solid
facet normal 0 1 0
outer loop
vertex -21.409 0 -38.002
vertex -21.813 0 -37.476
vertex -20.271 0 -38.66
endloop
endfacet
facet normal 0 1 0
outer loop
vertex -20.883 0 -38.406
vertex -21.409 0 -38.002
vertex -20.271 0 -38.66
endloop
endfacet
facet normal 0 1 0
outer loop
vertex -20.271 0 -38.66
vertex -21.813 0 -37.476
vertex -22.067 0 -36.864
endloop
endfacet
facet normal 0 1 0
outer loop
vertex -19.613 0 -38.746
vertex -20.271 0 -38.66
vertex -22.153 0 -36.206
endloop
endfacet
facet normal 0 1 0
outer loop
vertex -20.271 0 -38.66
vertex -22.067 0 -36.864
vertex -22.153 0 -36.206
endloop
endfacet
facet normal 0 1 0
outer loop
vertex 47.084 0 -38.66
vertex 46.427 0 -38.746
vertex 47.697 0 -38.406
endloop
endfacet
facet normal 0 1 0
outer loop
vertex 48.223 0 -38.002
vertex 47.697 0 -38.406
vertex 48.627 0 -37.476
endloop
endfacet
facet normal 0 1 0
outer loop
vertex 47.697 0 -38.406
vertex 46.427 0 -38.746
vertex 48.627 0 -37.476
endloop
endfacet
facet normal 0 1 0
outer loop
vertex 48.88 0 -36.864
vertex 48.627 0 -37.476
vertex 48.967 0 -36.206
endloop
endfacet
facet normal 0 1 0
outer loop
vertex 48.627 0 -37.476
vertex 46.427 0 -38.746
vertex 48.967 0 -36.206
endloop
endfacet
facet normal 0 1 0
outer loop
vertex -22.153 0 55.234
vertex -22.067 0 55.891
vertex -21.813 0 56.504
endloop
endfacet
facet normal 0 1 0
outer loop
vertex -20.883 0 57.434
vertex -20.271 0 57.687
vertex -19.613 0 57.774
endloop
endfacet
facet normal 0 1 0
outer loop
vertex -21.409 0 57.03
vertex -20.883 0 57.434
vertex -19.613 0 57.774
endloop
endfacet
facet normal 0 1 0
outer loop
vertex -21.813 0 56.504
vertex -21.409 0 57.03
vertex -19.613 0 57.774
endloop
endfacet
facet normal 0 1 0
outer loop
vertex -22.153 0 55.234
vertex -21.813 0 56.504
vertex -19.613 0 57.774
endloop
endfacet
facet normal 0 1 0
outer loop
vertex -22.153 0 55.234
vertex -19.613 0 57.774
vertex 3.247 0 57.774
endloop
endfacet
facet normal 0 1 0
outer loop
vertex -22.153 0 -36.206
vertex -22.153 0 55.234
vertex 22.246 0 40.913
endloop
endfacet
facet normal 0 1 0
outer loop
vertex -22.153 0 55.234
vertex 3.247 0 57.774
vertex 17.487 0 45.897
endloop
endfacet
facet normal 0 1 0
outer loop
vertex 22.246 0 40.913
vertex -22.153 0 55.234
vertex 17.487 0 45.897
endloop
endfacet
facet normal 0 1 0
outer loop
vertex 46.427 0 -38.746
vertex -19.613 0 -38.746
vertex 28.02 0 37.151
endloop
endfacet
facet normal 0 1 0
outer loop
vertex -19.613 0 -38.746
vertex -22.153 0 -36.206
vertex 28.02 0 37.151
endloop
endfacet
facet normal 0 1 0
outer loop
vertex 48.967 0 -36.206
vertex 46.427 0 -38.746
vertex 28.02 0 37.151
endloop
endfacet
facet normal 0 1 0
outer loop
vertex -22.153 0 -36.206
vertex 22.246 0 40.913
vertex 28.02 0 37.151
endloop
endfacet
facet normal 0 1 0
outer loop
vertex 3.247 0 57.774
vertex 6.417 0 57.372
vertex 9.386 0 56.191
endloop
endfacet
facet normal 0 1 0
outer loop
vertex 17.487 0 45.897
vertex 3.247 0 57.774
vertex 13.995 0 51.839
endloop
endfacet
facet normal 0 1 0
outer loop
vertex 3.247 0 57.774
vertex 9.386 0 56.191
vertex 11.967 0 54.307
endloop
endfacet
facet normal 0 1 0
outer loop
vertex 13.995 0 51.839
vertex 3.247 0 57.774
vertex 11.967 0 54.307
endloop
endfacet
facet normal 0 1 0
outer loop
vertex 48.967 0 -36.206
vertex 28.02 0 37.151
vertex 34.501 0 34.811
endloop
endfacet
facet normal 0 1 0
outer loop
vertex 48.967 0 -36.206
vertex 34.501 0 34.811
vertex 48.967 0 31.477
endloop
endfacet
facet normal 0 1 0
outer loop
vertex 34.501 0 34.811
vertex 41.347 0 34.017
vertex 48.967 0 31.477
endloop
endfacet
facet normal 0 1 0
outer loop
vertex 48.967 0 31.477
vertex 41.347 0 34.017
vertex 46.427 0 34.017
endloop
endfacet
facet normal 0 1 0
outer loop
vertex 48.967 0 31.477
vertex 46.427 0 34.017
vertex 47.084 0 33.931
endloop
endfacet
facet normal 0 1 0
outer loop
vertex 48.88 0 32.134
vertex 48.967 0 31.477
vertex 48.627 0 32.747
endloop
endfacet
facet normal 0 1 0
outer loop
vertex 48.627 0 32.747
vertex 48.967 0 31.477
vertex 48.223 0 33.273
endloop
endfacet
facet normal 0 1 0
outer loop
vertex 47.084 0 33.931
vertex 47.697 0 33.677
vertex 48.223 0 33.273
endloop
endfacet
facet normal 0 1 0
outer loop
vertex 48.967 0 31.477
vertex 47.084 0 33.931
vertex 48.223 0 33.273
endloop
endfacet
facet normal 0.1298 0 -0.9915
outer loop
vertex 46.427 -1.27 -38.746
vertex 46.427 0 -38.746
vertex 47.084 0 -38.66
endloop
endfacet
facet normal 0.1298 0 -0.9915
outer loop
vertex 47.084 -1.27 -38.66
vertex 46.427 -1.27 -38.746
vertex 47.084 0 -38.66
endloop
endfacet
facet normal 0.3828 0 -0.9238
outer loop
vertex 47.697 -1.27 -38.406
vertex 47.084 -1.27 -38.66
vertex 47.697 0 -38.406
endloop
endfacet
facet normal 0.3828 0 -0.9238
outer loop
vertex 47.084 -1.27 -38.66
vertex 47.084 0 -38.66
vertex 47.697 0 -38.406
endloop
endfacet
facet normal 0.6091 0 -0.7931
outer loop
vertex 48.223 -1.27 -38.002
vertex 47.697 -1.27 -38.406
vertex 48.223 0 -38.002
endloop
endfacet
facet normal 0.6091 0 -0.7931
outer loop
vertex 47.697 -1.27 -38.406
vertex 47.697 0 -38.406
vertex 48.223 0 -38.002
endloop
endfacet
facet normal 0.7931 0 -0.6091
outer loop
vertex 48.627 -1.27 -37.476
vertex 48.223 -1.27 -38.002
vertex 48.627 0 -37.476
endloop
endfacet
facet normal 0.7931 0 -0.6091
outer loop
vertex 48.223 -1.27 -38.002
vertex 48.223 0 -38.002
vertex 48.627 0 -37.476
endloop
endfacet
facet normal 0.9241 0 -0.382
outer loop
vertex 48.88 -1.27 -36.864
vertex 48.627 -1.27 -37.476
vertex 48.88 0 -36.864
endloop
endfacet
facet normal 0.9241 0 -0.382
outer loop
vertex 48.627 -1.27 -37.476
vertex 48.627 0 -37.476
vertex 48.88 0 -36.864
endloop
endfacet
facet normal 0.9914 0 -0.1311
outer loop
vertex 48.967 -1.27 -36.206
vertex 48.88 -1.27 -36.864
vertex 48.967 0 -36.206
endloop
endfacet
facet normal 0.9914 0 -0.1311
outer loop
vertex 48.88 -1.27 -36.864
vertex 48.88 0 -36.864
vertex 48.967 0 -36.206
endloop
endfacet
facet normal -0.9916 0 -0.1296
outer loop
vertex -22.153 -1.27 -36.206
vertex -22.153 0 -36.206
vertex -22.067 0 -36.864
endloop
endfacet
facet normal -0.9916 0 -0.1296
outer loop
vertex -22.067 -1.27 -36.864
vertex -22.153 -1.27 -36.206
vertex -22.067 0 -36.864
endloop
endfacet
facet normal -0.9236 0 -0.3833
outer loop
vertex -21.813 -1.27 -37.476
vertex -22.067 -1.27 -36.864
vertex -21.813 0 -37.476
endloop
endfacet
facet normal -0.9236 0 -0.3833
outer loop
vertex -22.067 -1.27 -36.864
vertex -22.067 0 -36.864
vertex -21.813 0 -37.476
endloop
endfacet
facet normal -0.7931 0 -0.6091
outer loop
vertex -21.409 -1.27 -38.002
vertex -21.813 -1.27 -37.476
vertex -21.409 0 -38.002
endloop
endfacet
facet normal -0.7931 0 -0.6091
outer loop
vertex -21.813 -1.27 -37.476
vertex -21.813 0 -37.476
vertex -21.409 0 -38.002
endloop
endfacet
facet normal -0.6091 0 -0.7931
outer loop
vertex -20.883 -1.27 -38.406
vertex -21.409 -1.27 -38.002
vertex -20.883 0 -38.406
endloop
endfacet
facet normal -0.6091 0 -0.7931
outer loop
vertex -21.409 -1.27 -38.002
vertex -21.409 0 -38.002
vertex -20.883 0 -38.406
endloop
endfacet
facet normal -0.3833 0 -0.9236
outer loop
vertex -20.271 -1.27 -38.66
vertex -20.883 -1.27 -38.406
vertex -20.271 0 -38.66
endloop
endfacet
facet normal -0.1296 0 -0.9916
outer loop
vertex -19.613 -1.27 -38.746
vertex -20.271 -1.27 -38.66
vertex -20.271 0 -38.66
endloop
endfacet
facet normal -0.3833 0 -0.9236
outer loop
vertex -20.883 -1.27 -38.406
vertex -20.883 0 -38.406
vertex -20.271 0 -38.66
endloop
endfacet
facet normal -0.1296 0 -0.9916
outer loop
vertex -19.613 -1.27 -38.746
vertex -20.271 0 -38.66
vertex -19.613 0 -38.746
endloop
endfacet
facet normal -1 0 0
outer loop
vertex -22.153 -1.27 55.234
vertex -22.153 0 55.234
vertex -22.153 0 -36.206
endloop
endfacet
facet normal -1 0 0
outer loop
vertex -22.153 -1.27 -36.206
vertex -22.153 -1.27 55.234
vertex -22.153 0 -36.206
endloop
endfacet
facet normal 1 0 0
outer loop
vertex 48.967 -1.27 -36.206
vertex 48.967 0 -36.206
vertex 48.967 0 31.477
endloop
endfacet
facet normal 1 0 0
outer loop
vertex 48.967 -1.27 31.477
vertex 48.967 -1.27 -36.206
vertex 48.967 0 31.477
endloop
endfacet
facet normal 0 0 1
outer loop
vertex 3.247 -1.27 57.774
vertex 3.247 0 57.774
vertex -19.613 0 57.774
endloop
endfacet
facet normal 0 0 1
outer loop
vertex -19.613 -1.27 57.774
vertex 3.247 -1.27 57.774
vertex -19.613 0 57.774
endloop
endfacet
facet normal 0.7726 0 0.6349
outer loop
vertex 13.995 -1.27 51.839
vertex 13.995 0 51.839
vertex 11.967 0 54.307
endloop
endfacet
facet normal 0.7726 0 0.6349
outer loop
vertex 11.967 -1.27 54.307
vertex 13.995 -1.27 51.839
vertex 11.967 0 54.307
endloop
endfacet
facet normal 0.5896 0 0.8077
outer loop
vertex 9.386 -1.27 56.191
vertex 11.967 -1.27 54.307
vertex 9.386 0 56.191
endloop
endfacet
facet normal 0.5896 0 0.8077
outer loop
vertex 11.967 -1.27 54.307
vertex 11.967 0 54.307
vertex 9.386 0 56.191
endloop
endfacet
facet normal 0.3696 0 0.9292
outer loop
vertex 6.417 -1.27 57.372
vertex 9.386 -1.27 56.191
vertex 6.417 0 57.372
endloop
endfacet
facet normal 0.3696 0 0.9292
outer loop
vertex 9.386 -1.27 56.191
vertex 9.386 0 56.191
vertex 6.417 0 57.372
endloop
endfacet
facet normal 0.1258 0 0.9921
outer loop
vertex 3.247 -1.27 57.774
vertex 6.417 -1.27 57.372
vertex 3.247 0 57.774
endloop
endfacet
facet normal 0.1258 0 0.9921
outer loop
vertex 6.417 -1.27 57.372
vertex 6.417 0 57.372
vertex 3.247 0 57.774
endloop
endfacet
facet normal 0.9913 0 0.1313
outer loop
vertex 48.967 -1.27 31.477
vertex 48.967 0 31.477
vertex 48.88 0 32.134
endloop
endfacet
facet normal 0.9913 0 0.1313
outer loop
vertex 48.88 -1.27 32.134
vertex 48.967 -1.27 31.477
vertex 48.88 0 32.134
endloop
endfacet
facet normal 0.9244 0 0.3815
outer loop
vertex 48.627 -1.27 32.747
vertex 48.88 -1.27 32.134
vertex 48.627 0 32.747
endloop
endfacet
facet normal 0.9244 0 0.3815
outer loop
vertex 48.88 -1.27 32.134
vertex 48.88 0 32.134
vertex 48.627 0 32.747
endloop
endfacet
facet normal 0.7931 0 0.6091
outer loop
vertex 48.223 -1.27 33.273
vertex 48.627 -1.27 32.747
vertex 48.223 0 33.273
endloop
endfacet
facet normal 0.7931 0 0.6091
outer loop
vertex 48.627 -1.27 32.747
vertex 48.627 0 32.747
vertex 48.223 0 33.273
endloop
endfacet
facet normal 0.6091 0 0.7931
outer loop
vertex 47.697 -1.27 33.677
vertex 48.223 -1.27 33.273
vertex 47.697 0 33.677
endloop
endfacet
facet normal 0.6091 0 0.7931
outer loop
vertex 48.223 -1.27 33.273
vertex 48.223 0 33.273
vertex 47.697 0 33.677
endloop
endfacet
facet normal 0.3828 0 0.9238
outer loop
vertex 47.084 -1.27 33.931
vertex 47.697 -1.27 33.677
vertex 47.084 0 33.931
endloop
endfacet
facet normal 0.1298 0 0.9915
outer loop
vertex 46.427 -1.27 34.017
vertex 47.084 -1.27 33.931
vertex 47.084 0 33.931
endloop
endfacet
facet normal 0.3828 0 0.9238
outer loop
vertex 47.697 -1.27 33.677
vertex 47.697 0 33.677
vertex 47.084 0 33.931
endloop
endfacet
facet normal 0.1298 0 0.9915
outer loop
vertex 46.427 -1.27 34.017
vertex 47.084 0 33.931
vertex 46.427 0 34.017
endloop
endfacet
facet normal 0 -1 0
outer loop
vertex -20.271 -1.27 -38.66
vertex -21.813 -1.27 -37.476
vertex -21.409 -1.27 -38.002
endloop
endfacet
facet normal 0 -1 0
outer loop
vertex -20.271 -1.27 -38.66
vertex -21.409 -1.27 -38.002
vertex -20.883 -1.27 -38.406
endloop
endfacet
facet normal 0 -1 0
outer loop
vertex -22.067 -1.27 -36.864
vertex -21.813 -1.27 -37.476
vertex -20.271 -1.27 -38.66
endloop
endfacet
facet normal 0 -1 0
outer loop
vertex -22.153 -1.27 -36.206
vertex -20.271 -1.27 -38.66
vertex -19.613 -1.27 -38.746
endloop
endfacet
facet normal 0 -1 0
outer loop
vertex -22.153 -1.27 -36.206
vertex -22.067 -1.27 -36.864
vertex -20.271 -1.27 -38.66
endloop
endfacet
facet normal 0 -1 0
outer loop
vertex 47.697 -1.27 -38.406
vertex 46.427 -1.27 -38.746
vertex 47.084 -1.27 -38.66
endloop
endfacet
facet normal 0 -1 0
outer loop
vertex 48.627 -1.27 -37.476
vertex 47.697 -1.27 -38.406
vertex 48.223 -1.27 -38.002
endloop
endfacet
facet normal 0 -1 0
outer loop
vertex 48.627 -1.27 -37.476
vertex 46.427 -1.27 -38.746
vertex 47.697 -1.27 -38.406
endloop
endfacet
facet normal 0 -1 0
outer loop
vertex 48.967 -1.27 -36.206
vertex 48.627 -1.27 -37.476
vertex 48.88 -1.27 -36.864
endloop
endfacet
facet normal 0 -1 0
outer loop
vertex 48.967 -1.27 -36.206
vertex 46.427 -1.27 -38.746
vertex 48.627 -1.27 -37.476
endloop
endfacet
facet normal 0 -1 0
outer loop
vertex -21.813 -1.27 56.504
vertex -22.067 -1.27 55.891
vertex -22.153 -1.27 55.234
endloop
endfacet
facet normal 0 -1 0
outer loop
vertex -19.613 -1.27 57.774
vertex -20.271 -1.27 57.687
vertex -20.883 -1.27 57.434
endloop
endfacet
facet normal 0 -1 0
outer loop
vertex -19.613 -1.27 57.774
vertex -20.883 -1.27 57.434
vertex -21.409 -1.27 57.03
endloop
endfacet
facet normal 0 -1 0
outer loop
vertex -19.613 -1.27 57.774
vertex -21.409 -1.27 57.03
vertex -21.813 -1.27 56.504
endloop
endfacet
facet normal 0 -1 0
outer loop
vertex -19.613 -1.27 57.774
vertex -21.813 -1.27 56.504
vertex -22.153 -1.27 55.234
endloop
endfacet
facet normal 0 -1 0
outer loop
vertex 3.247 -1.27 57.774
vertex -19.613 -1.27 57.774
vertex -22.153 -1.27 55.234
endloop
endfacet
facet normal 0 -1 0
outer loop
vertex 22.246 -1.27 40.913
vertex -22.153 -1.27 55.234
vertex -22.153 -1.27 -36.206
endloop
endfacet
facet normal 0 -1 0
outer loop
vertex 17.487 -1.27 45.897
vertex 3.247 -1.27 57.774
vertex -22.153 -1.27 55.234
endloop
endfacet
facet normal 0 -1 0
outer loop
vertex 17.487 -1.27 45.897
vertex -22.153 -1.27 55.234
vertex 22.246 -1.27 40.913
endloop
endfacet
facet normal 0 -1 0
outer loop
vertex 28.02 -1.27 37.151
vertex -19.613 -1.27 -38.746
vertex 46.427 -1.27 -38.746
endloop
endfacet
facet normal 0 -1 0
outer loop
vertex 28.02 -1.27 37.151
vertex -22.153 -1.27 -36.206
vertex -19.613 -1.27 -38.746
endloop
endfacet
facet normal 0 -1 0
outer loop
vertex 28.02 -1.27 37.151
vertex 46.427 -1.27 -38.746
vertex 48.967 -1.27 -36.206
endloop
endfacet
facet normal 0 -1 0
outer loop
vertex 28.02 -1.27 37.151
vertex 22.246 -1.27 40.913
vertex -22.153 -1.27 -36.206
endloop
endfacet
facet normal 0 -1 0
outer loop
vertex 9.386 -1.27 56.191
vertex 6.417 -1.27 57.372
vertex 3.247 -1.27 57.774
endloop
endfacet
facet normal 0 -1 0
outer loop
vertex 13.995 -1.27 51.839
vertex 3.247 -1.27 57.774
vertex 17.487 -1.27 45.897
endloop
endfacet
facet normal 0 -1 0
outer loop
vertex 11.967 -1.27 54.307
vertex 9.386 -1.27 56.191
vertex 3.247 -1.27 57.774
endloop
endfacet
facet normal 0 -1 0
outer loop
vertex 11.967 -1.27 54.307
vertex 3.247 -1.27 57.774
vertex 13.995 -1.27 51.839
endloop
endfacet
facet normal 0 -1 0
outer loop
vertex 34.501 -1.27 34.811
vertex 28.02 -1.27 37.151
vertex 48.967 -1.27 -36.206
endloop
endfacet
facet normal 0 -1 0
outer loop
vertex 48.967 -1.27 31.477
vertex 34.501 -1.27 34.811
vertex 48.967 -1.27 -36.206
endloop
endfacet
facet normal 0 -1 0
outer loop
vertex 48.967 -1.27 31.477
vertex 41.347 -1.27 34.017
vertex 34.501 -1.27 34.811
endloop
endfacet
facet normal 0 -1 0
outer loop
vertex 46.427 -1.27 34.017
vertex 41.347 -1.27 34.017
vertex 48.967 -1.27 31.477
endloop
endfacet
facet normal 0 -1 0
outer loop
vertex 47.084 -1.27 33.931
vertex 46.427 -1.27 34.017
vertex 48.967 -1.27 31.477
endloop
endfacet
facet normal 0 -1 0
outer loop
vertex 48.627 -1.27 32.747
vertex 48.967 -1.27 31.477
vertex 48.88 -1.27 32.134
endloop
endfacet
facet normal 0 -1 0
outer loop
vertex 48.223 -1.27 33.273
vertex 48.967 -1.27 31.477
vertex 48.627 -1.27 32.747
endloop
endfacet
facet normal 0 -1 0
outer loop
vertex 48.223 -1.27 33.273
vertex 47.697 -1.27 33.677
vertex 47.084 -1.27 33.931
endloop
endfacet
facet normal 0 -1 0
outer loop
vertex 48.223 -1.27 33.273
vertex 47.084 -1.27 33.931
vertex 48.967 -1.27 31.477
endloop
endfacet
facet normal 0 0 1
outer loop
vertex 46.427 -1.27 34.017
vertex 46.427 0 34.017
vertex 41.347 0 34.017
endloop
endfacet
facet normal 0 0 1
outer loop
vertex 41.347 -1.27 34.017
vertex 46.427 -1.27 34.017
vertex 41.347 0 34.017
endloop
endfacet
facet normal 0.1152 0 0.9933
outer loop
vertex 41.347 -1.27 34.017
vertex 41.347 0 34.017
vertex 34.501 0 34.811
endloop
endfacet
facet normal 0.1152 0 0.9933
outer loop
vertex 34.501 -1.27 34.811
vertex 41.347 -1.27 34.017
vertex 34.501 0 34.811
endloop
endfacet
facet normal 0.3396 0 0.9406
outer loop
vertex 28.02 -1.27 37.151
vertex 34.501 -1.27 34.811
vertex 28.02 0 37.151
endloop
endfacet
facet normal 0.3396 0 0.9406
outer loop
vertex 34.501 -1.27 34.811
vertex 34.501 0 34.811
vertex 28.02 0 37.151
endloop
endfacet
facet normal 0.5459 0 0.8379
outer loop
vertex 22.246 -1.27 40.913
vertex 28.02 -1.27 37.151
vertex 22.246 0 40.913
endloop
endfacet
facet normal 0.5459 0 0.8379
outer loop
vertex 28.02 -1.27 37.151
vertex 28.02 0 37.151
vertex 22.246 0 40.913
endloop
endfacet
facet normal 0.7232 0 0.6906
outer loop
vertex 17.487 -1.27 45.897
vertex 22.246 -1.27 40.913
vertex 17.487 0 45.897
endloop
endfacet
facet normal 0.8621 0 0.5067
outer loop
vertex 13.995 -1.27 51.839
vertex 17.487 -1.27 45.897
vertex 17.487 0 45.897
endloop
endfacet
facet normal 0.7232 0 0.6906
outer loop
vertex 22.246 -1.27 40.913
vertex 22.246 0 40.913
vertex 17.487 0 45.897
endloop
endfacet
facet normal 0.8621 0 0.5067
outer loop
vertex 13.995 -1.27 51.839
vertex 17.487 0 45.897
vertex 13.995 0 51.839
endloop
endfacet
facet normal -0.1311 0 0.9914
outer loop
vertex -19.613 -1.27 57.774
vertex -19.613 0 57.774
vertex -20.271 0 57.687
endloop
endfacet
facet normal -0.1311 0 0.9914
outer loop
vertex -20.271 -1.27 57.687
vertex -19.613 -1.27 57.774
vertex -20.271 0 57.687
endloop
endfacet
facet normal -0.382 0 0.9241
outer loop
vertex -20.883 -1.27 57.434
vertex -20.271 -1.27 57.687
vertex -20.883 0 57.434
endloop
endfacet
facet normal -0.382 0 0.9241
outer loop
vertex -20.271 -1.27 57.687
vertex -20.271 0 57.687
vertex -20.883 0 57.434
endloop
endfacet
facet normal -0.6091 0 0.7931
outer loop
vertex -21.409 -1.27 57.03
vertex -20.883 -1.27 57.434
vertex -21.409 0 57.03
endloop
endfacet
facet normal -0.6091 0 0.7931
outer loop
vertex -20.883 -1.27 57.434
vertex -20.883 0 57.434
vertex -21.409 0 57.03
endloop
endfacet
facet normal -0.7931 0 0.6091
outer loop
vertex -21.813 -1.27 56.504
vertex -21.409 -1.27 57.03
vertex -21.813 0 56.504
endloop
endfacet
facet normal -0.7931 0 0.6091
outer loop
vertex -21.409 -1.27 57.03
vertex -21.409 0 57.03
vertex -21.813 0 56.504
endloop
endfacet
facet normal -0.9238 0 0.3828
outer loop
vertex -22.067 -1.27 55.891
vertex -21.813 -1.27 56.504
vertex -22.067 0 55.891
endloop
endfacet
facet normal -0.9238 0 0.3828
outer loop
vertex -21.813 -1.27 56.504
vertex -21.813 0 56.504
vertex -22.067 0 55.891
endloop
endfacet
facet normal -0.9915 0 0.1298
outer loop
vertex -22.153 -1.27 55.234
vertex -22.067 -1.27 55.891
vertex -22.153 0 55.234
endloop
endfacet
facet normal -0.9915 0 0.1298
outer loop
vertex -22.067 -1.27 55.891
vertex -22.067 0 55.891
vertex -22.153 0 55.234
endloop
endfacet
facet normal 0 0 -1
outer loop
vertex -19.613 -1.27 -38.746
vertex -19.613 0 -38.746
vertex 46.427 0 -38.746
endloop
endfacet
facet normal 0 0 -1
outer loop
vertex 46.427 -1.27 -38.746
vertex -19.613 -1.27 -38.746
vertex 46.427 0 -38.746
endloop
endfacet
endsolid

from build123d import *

# Parameters (mm, degrees)
F1_DEPTH = 1.27


with BuildPart() as f1:
    # F0 (on Front) → F1 (new body)
    with BuildSketch(Plane.XZ):
        with BuildLine():
            Line((3.246805, 57.773859), (-19.613195, 57.773859))
            ThreePointArc((-19.613195, 57.773859), (-21.409247, 57.02991), (-22.153195, 55.233859))
            Line((-22.153195, 55.233859), (-22.153195, -36.206141))
            ThreePointArc((-22.153195, -36.206141), (-21.409247, -38.002193), (-19.613195, -38.746141))
            Line((-19.613195, -38.746141), (46.426805, -38.746141))
            ThreePointArc((46.426805, -38.746141), (48.222856, -38.002193), (48.966805, -36.206141))
            Line((48.966805, -36.206141), (48.966805, 31.477067))
            ThreePointArc((48.966805, 31.477067), (48.222856, 33.273119), (46.426805, 34.017067))
            Line((46.426805, 34.017067), (41.346805, 34.017067))
            ThreePointArc((41.346805, 34.017067), (25.02413, 38.865573), (13.995192, 51.838633))
            ThreePointArc((13.995192, 51.838633), (9.385916, 56.191471), (3.246805, 57.773859))
        make_face()
    extrude(amount=F1_DEPTH)


solid = f1.part
